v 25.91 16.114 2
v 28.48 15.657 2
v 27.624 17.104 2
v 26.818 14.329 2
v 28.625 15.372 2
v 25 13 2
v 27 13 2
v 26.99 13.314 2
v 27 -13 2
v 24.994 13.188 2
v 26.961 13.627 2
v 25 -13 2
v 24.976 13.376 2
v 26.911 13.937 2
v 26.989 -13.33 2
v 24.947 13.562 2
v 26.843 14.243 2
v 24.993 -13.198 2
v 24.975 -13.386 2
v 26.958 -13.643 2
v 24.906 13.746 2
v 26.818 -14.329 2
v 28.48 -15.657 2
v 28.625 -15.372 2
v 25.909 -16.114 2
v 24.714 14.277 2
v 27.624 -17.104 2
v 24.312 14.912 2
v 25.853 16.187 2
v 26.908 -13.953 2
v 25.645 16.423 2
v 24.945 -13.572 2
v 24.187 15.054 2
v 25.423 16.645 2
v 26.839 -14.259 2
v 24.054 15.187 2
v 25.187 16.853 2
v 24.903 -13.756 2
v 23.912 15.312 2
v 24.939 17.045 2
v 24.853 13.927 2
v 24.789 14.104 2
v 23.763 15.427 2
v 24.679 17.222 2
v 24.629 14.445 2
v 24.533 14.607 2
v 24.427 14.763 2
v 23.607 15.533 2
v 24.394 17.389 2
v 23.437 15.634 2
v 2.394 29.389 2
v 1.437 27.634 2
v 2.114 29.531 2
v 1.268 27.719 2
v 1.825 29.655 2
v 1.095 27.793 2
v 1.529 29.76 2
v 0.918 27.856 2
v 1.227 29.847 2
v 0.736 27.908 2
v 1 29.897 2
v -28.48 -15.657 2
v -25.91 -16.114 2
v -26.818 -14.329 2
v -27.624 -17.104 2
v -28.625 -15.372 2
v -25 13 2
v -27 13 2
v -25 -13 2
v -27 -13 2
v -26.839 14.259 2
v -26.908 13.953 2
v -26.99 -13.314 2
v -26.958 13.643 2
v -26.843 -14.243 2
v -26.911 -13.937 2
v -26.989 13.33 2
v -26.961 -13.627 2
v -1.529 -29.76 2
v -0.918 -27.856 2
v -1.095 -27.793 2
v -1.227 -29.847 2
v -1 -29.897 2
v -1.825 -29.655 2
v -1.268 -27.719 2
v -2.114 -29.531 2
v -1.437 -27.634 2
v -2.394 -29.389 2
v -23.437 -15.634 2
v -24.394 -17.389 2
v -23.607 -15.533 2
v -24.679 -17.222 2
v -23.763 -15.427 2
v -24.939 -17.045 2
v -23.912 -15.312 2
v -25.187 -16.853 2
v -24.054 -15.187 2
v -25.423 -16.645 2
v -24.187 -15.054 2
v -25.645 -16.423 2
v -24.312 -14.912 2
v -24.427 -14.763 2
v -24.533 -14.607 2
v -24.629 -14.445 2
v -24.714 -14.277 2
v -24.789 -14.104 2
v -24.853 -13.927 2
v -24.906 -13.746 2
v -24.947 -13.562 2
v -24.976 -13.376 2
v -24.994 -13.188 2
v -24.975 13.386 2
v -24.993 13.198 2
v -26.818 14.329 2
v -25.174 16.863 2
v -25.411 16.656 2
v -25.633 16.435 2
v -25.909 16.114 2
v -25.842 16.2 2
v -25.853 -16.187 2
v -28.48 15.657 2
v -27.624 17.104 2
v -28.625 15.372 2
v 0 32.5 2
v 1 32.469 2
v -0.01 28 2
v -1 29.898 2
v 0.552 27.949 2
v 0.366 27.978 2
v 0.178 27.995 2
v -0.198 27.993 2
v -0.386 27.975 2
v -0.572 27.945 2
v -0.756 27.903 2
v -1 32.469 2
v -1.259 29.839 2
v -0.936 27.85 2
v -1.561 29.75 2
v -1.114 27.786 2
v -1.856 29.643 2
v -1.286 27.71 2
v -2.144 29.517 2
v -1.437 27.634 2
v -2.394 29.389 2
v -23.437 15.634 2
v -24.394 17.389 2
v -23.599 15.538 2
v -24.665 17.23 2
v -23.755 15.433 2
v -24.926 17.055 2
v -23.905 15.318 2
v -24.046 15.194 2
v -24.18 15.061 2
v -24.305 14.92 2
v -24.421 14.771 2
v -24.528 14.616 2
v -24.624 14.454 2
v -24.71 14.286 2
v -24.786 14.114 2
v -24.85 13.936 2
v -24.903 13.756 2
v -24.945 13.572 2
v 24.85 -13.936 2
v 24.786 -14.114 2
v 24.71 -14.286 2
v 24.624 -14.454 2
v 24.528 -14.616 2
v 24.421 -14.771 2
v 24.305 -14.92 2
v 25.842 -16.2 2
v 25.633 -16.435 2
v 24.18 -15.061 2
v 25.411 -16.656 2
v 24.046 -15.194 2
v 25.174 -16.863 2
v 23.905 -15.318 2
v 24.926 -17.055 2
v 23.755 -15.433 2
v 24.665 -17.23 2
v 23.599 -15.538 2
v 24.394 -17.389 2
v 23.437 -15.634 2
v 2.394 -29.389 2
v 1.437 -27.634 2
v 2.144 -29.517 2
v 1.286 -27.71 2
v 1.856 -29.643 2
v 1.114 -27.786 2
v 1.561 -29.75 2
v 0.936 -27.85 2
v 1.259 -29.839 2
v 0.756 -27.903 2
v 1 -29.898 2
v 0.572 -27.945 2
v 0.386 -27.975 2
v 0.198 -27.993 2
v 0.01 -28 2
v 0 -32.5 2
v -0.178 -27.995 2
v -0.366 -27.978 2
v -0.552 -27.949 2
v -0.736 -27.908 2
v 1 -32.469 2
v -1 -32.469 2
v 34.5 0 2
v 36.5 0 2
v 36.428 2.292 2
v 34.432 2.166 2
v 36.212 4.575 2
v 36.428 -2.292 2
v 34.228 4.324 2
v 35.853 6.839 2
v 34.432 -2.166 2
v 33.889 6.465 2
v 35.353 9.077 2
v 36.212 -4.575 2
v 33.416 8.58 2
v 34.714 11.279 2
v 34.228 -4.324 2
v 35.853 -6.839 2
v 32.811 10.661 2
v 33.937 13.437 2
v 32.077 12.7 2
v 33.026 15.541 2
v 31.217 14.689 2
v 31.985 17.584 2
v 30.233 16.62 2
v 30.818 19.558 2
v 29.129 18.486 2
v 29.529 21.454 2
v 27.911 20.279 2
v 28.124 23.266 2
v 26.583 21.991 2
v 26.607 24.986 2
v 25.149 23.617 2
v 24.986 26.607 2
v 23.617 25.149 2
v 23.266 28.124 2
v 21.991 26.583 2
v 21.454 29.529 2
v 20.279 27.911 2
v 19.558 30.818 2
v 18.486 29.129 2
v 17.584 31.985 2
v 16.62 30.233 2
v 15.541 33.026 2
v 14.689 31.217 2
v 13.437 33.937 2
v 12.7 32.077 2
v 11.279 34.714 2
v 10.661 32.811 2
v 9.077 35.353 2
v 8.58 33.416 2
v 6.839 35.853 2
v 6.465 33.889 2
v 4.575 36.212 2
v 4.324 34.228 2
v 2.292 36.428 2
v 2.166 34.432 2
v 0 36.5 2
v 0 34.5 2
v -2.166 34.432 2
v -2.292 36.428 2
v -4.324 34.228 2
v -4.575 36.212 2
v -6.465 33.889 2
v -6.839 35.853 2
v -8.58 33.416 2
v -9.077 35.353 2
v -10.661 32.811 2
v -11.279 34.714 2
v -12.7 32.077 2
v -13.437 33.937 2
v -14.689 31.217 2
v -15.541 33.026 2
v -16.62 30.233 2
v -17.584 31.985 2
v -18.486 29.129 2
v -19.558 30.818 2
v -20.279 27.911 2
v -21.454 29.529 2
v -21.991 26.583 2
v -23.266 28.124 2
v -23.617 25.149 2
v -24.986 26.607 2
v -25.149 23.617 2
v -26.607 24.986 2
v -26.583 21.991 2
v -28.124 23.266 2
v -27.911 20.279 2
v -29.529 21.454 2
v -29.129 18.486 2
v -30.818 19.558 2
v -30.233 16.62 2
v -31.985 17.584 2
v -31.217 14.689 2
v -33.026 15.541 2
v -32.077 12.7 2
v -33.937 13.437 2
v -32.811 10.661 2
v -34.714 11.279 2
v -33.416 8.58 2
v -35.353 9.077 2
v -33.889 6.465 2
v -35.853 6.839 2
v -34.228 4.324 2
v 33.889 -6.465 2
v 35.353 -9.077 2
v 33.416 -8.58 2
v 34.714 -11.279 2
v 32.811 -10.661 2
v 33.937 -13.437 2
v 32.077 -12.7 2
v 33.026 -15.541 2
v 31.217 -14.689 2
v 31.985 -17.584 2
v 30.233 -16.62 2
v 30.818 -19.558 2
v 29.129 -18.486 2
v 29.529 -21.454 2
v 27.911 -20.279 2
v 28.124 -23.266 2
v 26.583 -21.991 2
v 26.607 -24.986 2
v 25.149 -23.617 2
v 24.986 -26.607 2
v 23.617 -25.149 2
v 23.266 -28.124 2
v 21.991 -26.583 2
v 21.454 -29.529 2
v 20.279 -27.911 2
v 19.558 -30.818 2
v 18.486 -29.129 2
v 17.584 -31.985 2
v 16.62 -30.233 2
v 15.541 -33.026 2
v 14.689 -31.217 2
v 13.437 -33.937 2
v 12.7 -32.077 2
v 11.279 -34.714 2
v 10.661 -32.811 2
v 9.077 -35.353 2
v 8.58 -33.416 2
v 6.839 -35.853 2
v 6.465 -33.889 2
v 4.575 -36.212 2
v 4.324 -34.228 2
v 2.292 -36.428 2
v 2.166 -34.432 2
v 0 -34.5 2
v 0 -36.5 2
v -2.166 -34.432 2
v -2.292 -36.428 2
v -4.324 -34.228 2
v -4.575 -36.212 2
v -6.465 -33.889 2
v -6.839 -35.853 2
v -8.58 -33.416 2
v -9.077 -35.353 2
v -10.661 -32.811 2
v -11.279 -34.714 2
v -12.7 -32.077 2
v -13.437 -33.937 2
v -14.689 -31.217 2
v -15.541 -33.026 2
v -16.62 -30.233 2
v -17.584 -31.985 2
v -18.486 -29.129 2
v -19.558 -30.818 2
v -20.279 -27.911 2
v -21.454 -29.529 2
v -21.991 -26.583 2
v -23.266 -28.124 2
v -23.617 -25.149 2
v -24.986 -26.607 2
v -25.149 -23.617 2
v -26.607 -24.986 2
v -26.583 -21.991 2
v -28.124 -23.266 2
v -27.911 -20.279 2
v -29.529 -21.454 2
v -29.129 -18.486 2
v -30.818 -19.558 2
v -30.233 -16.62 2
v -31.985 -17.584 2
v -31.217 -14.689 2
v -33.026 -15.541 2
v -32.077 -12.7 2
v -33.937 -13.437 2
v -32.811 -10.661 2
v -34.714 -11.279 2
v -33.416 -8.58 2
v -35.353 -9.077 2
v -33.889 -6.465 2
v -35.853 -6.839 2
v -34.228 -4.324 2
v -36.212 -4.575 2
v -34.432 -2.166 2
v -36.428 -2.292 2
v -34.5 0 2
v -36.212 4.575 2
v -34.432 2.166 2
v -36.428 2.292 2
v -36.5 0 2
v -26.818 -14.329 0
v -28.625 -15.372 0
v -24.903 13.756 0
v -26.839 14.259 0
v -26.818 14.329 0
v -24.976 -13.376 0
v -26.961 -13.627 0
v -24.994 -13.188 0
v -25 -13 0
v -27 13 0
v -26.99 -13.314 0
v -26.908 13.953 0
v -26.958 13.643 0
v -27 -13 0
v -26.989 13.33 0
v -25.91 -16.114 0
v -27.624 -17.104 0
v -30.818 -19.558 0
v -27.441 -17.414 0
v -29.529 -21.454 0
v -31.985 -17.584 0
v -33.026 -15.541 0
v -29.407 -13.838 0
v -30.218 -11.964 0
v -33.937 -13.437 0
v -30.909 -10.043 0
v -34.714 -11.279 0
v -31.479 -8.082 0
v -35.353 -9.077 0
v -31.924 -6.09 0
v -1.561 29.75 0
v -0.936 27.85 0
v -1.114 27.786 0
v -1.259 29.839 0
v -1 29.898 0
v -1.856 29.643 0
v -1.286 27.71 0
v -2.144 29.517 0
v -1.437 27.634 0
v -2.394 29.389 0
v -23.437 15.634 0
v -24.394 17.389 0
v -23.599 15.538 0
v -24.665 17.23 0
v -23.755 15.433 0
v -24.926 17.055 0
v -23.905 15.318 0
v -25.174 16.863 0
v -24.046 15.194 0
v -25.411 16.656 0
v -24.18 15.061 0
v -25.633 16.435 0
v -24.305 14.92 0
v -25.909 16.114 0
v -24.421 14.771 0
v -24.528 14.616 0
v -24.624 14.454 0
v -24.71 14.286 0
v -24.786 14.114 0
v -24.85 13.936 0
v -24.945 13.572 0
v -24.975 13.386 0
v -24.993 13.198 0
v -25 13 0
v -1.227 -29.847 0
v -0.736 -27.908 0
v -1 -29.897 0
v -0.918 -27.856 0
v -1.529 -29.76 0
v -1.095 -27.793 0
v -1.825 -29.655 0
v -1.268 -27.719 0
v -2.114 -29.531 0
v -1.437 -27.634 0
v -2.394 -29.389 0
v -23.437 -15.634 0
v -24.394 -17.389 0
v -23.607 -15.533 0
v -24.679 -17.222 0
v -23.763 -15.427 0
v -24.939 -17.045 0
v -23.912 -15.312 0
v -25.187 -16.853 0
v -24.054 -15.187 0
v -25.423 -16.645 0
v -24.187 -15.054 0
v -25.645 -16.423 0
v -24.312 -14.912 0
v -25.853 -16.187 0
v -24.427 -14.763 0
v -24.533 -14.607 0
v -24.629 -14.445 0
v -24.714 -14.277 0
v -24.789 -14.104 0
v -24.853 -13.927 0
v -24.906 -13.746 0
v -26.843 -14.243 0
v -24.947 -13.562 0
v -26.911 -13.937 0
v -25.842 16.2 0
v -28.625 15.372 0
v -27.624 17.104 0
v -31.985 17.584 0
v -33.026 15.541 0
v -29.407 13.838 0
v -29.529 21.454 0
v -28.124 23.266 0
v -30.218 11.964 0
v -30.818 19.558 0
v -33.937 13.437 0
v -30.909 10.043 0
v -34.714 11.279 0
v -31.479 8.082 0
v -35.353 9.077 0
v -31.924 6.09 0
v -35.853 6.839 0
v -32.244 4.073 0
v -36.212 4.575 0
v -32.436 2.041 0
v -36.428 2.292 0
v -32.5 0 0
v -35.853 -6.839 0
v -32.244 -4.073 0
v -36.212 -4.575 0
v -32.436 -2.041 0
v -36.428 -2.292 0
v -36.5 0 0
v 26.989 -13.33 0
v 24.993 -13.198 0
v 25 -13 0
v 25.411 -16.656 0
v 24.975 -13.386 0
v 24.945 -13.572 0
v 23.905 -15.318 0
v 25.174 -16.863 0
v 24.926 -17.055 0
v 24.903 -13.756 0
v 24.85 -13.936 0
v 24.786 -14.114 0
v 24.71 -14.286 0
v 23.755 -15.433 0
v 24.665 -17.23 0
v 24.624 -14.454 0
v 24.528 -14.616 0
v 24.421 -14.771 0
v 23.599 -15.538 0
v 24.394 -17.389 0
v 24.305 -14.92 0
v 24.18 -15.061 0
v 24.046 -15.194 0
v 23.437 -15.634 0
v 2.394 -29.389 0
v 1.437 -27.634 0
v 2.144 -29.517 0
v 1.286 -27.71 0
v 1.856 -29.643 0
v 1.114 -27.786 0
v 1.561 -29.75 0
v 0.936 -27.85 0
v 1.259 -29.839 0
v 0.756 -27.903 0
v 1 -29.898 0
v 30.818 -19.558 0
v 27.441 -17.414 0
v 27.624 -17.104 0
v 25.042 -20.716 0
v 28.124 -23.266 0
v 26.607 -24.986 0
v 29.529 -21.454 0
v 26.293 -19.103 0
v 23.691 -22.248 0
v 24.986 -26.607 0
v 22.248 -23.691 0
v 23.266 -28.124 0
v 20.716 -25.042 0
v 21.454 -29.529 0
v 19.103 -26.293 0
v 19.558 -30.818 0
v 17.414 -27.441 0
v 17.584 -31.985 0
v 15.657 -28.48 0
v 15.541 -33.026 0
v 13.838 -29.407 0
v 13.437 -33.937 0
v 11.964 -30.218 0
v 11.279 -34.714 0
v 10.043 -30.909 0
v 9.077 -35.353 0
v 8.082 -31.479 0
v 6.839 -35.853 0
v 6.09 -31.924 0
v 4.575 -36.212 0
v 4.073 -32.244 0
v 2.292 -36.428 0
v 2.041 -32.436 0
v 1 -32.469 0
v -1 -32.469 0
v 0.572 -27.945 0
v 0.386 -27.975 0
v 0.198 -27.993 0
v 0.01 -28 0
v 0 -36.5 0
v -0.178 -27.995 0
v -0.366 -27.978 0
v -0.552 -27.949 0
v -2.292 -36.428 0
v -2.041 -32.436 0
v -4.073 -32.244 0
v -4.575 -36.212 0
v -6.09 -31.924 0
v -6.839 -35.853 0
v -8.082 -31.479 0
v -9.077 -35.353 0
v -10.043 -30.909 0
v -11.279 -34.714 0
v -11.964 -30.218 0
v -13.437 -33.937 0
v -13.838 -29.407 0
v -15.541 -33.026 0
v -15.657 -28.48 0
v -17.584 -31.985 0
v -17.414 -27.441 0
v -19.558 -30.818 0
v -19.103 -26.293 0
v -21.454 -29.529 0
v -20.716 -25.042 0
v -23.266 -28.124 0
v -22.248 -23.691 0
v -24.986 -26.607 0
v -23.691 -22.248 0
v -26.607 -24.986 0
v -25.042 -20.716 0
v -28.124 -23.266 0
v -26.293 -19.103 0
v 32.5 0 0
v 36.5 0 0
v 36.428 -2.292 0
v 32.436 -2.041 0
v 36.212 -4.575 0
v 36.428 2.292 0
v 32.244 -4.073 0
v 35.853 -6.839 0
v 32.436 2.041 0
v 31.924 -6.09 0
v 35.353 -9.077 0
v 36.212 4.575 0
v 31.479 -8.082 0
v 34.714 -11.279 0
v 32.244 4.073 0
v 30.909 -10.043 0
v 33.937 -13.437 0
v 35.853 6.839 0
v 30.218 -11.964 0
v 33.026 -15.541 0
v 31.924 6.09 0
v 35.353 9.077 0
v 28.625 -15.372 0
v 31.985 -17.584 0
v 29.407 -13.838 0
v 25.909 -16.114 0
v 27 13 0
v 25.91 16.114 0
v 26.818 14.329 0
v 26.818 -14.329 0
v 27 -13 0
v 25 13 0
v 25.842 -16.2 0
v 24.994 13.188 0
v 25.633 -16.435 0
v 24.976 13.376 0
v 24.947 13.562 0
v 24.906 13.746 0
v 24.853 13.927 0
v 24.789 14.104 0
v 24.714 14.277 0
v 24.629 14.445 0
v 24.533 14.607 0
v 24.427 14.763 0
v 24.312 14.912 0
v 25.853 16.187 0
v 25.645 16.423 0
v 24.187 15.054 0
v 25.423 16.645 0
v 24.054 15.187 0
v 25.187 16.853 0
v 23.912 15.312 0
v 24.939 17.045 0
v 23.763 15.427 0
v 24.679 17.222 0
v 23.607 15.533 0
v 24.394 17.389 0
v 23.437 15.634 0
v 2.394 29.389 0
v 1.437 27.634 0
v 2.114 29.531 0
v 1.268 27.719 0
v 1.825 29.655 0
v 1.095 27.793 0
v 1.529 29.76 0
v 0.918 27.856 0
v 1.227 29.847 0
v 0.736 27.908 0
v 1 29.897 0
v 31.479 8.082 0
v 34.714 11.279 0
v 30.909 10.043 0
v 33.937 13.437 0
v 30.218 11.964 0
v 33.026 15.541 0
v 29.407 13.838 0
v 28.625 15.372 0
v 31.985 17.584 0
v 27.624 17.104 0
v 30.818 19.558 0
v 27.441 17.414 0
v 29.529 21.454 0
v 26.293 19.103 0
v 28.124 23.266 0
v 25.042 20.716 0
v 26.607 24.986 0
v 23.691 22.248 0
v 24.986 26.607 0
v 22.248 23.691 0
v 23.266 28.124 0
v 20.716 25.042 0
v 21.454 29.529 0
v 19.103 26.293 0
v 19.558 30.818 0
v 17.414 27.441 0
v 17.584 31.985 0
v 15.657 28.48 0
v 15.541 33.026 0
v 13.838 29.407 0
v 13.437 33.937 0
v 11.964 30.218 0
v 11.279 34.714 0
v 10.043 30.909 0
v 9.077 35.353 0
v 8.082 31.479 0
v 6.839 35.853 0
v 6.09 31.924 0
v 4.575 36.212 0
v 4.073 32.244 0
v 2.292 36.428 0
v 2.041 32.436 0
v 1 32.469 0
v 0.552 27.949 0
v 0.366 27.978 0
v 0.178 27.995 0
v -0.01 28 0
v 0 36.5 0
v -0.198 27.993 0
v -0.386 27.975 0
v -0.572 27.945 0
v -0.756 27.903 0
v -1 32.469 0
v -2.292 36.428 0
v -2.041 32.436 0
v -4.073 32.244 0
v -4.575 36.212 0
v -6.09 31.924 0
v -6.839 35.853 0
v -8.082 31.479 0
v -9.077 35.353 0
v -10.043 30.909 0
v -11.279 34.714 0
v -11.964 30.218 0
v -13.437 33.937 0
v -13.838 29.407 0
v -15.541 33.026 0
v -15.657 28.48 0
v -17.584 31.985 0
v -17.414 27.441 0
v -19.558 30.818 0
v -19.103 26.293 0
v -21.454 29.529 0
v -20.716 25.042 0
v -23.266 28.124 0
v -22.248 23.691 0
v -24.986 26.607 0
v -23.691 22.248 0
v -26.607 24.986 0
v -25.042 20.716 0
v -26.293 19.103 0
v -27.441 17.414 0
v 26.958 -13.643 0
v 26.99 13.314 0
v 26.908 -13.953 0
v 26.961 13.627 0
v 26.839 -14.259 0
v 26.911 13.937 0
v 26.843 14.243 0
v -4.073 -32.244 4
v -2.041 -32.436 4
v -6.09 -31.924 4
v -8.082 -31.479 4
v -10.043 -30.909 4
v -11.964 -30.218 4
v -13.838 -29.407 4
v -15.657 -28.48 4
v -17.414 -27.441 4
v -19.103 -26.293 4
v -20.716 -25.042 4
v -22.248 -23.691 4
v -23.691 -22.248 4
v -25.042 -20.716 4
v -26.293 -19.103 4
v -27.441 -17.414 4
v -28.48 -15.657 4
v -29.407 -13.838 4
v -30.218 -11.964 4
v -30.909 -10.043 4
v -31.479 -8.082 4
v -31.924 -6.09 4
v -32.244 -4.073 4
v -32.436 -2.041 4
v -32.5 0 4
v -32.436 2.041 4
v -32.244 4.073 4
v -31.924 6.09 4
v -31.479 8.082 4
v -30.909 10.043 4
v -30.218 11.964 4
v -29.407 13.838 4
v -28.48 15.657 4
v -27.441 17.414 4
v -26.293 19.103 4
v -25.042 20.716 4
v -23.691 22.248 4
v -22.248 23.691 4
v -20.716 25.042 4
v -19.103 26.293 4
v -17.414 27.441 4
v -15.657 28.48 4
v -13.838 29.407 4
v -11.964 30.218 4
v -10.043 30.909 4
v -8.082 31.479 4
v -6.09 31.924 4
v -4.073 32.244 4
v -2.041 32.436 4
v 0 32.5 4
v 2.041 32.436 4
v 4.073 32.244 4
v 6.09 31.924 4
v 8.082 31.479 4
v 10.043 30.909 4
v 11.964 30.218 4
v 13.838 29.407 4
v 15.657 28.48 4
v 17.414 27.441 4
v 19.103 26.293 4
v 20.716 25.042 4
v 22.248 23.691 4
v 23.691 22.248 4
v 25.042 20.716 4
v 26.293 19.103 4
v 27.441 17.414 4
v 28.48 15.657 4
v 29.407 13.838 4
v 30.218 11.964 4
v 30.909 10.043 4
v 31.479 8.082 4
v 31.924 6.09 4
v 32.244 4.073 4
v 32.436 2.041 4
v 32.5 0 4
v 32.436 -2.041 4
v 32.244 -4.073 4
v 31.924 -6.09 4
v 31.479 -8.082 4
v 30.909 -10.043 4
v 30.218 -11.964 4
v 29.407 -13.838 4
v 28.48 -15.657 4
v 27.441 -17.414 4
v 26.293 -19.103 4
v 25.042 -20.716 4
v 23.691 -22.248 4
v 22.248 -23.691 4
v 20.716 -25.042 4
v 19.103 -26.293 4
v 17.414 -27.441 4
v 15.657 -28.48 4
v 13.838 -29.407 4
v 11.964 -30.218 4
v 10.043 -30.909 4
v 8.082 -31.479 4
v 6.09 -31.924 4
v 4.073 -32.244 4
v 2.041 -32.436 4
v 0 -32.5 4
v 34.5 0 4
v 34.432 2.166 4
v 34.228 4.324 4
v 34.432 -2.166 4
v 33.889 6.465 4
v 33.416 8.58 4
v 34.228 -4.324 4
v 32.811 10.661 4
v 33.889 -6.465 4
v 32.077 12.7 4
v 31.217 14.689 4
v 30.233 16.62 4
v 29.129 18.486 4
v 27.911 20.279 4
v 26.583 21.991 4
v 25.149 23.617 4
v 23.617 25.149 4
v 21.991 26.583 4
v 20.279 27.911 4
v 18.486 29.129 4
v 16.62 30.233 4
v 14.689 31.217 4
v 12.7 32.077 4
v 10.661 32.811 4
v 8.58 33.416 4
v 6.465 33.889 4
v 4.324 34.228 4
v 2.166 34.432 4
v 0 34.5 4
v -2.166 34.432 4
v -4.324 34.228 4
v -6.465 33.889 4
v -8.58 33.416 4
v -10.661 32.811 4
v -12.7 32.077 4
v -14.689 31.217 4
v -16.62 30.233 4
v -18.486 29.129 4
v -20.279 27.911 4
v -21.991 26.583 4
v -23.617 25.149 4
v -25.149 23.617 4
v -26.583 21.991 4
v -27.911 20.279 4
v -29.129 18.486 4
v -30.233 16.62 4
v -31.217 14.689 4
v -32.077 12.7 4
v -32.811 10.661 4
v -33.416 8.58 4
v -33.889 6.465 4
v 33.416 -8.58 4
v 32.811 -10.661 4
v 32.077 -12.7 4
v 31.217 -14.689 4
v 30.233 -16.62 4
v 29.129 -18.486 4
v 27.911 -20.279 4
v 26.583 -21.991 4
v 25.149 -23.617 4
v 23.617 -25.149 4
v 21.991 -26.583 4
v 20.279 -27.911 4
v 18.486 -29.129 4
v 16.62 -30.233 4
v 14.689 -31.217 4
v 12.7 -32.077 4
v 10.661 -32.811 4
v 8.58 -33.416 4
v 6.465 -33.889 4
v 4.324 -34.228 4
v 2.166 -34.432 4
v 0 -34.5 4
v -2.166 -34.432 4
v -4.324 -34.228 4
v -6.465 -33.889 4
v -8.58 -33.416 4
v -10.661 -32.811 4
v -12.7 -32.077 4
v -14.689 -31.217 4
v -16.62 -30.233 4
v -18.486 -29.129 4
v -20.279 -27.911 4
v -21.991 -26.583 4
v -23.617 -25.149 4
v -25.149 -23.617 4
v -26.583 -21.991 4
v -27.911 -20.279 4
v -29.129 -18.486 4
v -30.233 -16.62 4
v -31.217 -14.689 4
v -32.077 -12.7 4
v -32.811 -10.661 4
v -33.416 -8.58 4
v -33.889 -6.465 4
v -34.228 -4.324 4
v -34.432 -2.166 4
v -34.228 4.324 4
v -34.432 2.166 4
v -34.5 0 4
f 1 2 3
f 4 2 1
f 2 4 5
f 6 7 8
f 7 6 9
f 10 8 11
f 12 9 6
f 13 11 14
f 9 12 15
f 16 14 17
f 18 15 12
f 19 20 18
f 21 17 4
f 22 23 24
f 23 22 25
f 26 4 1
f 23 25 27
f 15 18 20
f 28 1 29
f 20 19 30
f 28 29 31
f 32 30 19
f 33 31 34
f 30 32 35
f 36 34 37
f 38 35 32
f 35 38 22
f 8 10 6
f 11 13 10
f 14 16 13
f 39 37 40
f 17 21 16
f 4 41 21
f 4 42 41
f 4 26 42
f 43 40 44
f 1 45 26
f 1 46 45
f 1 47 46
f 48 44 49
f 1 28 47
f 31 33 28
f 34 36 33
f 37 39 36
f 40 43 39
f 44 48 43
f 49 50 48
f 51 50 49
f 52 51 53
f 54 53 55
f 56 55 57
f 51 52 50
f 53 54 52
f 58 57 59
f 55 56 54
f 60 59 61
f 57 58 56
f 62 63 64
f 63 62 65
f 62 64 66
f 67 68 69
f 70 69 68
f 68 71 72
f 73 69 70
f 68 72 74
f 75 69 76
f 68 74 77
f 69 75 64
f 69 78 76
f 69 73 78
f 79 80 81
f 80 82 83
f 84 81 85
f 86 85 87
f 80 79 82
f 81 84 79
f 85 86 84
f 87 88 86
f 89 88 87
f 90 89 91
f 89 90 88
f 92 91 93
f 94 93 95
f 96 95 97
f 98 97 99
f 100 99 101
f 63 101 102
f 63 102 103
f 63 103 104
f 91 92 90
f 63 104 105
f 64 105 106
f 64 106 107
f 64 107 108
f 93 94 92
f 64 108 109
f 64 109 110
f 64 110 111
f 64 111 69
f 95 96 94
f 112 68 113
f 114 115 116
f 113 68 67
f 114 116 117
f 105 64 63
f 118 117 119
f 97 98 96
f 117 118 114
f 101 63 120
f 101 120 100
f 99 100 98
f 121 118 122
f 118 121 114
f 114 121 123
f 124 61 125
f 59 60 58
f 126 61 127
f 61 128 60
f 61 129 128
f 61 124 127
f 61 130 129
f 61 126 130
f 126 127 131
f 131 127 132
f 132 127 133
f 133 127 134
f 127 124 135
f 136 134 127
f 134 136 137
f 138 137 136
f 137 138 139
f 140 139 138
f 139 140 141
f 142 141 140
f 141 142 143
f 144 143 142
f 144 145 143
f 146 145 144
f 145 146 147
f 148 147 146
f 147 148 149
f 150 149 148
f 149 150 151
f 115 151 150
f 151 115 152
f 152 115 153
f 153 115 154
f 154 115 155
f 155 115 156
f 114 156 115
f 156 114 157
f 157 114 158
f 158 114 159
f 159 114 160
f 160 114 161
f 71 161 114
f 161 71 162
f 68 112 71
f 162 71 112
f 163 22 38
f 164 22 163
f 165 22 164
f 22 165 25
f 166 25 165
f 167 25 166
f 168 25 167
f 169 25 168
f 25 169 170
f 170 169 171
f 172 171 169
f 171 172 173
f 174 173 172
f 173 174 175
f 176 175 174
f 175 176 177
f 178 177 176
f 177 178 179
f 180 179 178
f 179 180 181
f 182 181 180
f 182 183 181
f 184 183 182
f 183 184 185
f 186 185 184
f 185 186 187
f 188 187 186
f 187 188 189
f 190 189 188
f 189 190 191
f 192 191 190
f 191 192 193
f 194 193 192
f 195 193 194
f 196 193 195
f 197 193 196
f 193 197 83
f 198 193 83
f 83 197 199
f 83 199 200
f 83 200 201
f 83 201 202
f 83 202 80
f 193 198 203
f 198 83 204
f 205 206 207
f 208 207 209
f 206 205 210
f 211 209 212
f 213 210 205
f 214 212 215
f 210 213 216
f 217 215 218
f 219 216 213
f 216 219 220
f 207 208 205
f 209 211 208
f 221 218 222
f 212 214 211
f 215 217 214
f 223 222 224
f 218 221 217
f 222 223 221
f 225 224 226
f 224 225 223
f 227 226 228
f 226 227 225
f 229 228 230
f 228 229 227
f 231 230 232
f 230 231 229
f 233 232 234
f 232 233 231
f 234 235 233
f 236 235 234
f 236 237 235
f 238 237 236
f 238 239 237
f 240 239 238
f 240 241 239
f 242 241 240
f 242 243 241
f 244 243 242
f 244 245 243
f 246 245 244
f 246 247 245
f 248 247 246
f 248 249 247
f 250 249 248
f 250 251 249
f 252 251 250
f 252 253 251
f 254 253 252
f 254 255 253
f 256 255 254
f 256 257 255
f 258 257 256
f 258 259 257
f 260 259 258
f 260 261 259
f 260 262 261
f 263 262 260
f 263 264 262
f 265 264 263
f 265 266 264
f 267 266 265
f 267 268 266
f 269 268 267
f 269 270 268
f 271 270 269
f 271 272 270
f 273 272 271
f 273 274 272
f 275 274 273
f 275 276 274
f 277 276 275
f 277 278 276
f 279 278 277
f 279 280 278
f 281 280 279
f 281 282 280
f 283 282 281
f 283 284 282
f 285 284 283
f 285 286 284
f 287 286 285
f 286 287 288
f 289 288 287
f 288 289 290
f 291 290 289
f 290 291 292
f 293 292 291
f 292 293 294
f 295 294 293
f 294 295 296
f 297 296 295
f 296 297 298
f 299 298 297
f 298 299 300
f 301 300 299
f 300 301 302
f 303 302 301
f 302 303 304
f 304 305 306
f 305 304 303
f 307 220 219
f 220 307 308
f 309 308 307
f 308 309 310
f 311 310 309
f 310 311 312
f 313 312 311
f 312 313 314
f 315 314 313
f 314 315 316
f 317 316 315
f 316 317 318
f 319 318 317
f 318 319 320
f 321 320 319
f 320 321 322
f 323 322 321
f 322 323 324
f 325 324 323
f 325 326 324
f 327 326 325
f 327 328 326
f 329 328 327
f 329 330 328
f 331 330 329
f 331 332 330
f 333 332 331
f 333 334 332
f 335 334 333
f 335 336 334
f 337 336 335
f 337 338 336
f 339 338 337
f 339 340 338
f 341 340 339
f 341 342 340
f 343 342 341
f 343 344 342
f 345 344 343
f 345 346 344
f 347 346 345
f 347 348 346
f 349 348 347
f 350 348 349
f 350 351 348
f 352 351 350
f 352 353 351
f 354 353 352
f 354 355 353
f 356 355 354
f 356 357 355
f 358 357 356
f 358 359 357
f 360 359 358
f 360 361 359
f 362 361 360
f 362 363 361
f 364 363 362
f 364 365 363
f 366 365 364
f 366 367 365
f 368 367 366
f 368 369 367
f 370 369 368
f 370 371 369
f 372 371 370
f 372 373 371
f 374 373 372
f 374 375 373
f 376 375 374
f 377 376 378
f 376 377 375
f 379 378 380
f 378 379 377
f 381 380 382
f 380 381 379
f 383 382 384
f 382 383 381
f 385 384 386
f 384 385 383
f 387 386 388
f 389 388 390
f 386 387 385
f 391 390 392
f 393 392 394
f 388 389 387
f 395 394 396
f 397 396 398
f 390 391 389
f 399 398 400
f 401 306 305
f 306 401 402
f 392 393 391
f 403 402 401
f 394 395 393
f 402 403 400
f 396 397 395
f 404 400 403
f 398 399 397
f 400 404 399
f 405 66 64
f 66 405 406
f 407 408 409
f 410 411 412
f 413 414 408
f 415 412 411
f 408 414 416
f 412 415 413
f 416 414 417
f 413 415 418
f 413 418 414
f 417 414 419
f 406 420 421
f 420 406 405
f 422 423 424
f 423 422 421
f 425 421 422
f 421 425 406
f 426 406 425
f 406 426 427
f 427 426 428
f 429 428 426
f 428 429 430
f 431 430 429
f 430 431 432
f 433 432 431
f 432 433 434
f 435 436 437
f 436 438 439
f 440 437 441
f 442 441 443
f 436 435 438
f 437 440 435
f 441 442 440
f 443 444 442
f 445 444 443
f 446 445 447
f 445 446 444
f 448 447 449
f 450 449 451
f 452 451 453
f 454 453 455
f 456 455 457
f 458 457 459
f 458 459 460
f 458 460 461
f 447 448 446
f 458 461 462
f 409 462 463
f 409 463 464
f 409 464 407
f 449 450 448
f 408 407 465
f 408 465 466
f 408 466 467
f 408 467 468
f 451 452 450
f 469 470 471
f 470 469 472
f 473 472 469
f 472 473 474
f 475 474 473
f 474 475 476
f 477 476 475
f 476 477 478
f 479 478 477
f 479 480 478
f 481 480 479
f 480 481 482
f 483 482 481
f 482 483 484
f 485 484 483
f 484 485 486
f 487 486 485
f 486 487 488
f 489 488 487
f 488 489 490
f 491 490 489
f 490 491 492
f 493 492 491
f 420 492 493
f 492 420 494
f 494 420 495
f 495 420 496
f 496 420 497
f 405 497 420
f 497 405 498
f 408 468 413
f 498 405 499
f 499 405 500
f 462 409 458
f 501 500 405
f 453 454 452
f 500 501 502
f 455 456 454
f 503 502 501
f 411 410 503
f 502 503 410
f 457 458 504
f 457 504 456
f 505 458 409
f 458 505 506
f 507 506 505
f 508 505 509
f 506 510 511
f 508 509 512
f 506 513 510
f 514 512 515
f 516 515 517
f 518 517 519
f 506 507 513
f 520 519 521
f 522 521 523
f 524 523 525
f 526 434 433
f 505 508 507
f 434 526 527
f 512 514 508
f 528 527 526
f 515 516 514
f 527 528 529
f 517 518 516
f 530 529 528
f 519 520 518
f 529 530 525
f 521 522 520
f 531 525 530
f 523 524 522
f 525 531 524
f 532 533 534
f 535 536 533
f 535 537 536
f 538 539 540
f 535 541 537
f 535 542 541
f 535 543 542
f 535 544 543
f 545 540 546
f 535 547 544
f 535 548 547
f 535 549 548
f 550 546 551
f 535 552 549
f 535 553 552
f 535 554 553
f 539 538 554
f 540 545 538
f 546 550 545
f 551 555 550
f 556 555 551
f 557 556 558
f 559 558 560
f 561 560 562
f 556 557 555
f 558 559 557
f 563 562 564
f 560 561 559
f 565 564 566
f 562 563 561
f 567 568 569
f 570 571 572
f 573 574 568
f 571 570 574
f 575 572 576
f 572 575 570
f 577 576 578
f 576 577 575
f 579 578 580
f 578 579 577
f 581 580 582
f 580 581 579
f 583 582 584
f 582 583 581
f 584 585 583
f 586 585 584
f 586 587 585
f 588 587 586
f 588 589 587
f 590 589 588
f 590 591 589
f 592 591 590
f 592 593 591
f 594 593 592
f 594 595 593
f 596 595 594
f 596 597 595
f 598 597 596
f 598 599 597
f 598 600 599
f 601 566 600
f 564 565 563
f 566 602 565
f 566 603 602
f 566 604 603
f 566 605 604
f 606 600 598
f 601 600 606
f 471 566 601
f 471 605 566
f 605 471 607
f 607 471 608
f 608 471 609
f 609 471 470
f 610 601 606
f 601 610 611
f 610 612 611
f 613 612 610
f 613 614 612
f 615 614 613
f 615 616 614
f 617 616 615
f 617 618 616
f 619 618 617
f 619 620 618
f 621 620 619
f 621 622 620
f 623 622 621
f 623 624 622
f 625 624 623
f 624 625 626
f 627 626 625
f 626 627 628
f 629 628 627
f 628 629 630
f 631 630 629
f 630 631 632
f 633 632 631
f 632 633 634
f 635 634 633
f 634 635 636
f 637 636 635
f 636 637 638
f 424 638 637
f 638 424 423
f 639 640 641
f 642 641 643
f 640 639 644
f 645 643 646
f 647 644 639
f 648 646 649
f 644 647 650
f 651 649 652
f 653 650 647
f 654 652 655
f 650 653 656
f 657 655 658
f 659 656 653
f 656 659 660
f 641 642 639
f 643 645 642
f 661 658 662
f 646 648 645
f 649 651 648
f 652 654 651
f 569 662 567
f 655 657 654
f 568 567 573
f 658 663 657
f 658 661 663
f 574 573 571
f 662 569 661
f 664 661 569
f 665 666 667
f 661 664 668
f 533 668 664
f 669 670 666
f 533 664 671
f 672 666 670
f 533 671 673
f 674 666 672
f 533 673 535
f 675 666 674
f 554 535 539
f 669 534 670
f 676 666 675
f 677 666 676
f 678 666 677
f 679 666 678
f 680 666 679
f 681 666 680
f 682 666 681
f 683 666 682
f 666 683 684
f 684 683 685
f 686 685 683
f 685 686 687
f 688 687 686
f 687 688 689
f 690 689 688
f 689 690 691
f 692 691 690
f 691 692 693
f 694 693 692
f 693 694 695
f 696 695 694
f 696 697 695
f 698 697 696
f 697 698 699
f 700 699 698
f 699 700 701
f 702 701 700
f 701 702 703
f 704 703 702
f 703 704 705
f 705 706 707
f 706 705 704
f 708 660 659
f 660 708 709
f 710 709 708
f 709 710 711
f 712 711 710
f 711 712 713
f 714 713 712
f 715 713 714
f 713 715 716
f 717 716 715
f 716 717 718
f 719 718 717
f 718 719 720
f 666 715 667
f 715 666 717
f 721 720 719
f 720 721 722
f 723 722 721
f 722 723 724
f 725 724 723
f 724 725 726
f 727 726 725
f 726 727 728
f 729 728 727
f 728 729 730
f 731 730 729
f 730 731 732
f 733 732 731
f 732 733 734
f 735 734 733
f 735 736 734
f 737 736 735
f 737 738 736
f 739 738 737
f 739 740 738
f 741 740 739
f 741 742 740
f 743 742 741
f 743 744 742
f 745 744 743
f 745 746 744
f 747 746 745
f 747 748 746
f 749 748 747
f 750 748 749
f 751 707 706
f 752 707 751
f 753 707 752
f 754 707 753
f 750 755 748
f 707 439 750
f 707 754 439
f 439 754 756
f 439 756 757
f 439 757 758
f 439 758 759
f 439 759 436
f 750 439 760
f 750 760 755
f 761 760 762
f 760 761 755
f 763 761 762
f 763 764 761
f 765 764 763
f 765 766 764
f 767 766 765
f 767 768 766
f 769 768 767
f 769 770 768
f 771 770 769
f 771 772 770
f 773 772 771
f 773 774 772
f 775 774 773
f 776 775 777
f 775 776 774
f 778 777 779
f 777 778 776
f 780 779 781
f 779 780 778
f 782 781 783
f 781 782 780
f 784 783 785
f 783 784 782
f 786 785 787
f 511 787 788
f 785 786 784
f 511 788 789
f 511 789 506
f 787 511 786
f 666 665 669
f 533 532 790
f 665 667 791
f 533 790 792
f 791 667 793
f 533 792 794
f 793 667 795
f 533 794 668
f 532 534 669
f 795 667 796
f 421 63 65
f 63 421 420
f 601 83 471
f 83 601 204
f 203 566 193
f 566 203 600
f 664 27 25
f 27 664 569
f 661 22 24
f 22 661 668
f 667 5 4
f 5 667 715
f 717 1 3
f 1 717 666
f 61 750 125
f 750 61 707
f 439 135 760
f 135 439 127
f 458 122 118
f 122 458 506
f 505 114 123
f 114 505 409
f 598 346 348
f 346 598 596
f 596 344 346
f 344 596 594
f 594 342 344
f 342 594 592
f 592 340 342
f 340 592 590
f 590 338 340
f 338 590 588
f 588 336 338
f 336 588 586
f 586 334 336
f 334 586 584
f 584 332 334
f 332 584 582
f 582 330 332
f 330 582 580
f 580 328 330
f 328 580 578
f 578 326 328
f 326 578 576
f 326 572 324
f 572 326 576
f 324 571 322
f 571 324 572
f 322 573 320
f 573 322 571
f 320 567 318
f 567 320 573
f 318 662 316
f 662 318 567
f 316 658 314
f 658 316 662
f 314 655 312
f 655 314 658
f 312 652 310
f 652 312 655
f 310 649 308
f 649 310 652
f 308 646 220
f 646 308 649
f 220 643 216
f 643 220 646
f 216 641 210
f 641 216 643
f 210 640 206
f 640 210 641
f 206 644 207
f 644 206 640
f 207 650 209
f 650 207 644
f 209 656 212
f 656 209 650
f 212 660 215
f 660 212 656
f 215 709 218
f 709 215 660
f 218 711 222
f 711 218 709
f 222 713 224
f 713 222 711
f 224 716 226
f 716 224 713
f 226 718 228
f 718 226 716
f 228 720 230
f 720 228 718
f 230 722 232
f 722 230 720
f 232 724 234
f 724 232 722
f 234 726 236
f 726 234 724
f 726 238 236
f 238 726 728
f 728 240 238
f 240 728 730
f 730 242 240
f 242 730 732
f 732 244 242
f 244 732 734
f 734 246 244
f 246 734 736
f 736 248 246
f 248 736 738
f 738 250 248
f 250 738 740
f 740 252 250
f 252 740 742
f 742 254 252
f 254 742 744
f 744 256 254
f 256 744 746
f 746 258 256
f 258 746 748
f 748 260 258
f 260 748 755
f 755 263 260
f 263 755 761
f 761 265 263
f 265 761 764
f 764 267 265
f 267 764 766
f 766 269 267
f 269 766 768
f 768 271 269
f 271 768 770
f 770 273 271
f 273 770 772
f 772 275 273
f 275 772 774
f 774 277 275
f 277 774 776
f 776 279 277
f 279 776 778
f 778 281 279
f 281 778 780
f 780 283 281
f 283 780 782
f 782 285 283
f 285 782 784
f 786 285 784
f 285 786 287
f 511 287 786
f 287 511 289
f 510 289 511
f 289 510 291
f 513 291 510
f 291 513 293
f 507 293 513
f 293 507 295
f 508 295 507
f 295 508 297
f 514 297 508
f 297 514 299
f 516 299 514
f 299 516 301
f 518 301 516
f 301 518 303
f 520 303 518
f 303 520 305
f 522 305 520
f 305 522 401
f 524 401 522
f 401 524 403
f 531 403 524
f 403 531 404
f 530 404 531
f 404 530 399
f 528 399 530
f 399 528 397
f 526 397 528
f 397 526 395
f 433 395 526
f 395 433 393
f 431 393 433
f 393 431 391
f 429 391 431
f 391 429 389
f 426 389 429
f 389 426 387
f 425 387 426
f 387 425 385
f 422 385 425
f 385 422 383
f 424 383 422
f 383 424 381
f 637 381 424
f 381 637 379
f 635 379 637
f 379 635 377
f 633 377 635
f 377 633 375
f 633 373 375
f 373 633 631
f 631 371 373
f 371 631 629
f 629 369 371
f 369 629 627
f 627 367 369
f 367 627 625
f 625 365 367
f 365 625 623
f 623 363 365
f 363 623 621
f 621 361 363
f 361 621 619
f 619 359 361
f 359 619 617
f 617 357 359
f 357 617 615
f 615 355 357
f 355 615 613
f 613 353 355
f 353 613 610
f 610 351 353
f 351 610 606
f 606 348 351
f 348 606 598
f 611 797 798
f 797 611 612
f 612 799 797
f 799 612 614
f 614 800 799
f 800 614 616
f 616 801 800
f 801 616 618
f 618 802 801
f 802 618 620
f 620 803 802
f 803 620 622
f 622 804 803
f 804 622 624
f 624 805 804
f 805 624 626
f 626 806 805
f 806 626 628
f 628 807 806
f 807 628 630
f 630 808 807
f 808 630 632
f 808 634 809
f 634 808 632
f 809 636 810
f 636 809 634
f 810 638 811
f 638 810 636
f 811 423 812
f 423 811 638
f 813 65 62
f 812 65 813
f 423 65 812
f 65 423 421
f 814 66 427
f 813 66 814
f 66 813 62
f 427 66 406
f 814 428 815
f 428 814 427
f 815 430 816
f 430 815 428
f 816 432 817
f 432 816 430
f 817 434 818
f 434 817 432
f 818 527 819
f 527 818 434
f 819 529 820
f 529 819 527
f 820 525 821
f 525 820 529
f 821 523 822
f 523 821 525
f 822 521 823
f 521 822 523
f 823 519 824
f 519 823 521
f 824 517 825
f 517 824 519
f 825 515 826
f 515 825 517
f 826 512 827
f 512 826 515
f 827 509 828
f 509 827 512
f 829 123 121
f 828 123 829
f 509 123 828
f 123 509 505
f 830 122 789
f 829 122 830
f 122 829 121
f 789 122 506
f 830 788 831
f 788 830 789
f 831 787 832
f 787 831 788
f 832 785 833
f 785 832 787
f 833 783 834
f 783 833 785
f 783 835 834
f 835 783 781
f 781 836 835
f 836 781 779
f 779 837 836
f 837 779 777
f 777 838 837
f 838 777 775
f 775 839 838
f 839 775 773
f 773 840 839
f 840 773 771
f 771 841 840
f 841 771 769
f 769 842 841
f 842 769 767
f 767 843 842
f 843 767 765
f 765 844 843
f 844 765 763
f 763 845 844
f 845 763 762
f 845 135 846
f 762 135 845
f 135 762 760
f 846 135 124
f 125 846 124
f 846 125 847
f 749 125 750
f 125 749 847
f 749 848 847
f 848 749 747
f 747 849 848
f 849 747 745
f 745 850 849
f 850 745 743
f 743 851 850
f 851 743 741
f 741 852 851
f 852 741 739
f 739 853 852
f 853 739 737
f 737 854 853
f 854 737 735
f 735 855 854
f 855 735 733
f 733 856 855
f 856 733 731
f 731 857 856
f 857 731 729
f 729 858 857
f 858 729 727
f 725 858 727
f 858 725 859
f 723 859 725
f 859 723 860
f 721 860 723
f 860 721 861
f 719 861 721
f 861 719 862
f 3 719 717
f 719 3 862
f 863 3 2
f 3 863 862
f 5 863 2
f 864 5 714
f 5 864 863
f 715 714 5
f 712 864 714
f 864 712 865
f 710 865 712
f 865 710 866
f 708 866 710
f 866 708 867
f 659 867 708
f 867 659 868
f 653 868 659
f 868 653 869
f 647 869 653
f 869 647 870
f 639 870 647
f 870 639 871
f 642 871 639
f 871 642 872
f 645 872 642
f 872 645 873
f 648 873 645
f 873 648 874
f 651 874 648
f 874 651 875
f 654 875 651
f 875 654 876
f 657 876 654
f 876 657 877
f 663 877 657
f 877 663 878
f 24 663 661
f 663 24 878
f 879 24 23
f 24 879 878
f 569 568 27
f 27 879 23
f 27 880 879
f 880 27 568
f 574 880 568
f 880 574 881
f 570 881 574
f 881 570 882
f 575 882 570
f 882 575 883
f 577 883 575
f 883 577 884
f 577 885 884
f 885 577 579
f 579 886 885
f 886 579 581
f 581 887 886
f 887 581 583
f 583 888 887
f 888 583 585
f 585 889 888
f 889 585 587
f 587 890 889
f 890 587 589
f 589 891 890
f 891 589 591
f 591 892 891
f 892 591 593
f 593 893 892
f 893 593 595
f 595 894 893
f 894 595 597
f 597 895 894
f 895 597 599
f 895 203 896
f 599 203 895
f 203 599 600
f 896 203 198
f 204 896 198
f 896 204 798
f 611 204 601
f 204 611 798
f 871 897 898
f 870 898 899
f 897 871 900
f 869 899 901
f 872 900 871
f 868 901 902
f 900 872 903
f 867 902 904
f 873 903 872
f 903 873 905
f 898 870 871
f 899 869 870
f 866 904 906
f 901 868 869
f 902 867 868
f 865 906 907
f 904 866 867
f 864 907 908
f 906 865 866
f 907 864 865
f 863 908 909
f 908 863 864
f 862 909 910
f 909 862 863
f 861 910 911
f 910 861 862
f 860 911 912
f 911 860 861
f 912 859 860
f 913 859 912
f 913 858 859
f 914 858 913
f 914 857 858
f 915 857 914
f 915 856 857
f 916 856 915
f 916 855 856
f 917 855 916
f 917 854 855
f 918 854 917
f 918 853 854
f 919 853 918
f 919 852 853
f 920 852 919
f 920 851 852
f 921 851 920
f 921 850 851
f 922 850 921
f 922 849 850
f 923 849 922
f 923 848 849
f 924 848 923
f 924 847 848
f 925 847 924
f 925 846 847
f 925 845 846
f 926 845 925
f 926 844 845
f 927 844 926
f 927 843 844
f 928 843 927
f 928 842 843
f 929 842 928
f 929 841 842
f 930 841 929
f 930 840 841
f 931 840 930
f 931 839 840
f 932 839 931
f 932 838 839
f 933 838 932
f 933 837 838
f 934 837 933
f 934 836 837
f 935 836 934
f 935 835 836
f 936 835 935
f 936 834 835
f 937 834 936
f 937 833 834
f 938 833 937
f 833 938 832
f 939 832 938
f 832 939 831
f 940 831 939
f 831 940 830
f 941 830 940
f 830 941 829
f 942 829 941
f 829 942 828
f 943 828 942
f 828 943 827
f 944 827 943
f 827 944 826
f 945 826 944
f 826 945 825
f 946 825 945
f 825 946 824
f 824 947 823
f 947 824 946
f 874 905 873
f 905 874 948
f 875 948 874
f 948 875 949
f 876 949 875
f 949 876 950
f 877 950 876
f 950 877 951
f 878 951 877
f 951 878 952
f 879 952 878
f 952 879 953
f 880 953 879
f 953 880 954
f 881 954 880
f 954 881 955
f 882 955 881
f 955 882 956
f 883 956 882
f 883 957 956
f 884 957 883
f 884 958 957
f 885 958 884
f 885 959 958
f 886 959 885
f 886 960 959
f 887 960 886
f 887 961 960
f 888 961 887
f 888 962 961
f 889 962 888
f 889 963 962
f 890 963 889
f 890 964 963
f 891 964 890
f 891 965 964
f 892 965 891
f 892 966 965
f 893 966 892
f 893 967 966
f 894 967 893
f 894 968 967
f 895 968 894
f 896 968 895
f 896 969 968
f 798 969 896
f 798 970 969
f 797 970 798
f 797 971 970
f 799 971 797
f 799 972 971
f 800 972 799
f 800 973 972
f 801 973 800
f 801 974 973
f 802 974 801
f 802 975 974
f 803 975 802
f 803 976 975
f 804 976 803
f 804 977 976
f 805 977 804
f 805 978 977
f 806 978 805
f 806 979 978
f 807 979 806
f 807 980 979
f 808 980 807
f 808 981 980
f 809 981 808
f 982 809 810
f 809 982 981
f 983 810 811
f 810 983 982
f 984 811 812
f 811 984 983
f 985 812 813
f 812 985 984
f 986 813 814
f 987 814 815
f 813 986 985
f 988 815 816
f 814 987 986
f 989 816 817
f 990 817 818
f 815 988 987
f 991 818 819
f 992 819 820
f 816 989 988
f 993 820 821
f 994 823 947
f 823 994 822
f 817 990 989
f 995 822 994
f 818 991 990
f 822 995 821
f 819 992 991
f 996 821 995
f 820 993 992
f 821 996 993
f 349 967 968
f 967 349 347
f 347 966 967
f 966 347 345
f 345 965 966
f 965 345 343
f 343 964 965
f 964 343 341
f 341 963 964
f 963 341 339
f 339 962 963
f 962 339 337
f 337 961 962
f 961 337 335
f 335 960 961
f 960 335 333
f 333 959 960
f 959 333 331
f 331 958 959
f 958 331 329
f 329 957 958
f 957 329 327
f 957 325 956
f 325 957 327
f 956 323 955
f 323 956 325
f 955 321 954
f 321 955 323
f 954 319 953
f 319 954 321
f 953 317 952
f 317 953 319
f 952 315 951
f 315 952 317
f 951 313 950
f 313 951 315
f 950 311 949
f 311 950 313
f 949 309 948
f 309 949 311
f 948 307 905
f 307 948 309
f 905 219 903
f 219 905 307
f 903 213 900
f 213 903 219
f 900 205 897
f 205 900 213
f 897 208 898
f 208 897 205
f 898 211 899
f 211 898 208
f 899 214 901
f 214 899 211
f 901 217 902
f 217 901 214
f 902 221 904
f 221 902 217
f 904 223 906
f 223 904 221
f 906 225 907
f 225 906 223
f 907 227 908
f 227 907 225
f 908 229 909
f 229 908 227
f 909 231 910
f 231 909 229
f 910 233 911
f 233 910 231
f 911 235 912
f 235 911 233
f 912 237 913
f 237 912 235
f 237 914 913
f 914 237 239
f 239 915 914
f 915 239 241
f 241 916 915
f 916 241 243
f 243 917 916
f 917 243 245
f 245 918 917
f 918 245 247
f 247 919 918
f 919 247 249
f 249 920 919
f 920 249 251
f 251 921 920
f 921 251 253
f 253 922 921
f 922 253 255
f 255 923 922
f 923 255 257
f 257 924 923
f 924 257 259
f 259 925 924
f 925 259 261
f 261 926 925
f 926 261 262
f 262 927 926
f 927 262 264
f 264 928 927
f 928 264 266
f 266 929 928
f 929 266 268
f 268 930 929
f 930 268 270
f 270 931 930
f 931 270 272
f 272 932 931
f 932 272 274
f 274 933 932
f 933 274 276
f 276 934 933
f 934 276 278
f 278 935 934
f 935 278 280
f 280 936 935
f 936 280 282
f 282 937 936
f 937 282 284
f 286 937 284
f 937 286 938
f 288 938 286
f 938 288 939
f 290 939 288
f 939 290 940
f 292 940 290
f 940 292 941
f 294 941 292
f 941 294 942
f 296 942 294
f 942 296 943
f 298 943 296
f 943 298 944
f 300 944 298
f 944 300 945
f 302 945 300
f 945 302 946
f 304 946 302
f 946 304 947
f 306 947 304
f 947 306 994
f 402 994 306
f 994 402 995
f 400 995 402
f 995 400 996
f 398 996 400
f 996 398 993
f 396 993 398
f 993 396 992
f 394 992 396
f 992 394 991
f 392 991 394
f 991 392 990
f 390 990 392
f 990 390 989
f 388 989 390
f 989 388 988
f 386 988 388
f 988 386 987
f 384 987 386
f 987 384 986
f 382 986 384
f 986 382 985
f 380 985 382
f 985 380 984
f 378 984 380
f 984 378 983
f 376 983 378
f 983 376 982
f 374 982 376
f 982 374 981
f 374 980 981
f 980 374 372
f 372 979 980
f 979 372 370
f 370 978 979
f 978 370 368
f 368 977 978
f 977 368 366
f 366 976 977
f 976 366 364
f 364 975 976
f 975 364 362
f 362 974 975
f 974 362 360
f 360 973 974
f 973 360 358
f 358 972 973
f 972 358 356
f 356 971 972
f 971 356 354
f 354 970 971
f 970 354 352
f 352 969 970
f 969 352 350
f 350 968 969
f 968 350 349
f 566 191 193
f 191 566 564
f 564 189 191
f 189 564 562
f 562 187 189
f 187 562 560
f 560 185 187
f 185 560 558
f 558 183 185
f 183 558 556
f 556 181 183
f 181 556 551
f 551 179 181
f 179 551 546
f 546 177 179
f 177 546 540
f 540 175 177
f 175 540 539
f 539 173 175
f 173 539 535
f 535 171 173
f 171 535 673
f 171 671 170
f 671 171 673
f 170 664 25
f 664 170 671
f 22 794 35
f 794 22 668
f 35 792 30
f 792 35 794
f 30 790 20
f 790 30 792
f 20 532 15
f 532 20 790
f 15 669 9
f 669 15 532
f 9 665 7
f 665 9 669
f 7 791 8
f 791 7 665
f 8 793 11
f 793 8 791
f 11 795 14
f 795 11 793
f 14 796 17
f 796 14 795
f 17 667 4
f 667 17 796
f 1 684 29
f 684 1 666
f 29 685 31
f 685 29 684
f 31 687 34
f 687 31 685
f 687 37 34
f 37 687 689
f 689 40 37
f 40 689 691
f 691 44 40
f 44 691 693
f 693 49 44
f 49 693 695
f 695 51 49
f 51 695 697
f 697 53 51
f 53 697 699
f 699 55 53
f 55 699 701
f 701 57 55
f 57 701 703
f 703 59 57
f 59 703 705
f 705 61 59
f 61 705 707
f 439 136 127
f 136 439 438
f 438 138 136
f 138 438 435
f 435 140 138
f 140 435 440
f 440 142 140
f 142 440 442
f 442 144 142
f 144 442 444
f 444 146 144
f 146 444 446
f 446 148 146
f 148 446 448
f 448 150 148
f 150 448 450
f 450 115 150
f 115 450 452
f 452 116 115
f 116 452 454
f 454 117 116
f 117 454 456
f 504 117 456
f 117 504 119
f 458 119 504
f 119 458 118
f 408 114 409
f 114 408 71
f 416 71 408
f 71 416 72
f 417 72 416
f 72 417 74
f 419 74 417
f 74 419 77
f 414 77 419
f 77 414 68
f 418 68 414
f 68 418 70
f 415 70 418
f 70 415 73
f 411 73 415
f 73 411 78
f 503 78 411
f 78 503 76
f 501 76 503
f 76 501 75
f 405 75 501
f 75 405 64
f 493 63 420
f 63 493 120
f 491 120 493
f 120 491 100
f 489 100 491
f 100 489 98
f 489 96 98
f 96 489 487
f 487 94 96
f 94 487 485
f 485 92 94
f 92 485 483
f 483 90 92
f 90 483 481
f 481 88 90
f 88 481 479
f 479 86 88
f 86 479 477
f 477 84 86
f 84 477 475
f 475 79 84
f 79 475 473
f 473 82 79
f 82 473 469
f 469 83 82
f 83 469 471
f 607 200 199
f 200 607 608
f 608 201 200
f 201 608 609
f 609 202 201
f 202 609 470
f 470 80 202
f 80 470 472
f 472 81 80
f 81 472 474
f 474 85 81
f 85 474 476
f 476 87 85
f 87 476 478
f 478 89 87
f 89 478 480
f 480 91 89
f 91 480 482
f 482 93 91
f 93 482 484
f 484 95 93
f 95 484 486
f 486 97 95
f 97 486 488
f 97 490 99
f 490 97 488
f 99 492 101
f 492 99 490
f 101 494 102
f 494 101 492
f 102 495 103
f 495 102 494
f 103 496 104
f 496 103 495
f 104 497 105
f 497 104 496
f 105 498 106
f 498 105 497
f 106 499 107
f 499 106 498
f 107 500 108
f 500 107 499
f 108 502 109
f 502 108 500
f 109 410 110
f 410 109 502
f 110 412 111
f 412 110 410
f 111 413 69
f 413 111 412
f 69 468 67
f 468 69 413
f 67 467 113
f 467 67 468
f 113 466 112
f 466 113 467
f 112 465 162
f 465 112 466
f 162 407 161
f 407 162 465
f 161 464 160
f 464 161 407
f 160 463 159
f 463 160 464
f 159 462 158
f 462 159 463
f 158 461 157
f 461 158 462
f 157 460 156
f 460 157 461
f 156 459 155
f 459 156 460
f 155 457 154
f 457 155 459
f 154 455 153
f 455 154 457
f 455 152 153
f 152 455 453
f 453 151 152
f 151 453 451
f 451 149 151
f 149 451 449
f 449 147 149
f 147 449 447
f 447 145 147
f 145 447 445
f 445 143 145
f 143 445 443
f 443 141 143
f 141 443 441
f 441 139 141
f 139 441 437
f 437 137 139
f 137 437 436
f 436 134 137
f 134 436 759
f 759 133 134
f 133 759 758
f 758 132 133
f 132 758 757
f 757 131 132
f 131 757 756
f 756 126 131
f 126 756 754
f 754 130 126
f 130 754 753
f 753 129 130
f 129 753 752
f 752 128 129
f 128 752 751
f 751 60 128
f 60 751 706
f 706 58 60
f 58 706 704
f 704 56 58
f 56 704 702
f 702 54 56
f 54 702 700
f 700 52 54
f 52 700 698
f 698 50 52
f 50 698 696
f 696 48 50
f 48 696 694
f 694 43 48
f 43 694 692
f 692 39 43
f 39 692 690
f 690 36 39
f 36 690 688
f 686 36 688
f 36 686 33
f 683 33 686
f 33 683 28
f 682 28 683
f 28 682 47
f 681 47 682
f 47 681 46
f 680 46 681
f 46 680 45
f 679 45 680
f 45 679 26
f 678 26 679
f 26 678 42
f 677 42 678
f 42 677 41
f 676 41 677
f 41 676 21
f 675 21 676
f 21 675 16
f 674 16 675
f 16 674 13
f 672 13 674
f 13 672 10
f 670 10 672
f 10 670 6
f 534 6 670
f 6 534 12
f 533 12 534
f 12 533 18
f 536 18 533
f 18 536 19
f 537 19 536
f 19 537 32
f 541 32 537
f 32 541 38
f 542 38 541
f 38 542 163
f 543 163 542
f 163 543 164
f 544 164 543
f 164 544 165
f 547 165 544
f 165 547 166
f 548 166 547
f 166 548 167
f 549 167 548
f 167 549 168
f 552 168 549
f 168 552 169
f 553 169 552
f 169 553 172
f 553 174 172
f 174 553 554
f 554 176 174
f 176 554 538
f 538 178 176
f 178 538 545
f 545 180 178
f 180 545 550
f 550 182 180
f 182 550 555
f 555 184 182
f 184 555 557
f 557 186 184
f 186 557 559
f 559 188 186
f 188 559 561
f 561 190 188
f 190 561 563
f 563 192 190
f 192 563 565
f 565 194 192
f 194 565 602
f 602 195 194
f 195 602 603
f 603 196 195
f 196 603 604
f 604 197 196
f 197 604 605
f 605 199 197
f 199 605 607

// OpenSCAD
$fn = 100;
avacado_diameter = 50;
dish_diameter = 69;
corner_radius = 10;

// linear_extrude(height = 60, twist = 90, slices = 60) {
//    difference() {
//      offset(r = 10) {
//       square(20, center = true);
//      }
//      offset(r = 8) {
//        square(20, center = true);
//      }
//    }
//  }

module hexagon(center_x, center_y, size) {
  function hex_vertex(i) =
    let (angle_deg = 60 * i - 30)
      [
        round(center_x + size * cos(angle_deg)),
        round(center_y + size * sin(angle_deg))
      ];

  points = [ for (i = [1 : 6]) hex_vertex(i) ];
  polygon(points);
}

// rotate(30, [0, 0, 1])
//   difference() {
//     offset(r = 5)
//       hexagon(0, 0, 25);
//     offset(r = 4)
//       hexagon(0, 0, 25);
//   }
// cube([20, 50, 20]);

linear_extrude(2)
  difference() {
    circle((dish_diameter / 2) + 2);
    circle((dish_diameter / 2 - 2));
  }

for (a = [30 : 60 : 359])
rotate(a, [0, 0, 1])
  translate([-35, -1, 0])
    cube([6, 2, 2]);

translate([0, 0, 2])
  linear_extrude(2)
    difference() {
      circle(dish_diameter / 2);
      circle((dish_diameter / 2) - 2);
    }

linear_extrude(2)
  difference() {
    offset(r = 5)
      hexagon(0, 0, 25);
    offset(r = 3)
      hexagon(0, 0, 25);
  }

// start = (dish_diameter / 2) / 1.5;
// linear_extrude(height, twist = 120, slices = 120, scale = 1.5)
//   difference() {
//     offset(r = 10)
//       hexagon(0, 0, start);
//     offset(r = 8)
//       hexagon(0, 0, start);
//   }
